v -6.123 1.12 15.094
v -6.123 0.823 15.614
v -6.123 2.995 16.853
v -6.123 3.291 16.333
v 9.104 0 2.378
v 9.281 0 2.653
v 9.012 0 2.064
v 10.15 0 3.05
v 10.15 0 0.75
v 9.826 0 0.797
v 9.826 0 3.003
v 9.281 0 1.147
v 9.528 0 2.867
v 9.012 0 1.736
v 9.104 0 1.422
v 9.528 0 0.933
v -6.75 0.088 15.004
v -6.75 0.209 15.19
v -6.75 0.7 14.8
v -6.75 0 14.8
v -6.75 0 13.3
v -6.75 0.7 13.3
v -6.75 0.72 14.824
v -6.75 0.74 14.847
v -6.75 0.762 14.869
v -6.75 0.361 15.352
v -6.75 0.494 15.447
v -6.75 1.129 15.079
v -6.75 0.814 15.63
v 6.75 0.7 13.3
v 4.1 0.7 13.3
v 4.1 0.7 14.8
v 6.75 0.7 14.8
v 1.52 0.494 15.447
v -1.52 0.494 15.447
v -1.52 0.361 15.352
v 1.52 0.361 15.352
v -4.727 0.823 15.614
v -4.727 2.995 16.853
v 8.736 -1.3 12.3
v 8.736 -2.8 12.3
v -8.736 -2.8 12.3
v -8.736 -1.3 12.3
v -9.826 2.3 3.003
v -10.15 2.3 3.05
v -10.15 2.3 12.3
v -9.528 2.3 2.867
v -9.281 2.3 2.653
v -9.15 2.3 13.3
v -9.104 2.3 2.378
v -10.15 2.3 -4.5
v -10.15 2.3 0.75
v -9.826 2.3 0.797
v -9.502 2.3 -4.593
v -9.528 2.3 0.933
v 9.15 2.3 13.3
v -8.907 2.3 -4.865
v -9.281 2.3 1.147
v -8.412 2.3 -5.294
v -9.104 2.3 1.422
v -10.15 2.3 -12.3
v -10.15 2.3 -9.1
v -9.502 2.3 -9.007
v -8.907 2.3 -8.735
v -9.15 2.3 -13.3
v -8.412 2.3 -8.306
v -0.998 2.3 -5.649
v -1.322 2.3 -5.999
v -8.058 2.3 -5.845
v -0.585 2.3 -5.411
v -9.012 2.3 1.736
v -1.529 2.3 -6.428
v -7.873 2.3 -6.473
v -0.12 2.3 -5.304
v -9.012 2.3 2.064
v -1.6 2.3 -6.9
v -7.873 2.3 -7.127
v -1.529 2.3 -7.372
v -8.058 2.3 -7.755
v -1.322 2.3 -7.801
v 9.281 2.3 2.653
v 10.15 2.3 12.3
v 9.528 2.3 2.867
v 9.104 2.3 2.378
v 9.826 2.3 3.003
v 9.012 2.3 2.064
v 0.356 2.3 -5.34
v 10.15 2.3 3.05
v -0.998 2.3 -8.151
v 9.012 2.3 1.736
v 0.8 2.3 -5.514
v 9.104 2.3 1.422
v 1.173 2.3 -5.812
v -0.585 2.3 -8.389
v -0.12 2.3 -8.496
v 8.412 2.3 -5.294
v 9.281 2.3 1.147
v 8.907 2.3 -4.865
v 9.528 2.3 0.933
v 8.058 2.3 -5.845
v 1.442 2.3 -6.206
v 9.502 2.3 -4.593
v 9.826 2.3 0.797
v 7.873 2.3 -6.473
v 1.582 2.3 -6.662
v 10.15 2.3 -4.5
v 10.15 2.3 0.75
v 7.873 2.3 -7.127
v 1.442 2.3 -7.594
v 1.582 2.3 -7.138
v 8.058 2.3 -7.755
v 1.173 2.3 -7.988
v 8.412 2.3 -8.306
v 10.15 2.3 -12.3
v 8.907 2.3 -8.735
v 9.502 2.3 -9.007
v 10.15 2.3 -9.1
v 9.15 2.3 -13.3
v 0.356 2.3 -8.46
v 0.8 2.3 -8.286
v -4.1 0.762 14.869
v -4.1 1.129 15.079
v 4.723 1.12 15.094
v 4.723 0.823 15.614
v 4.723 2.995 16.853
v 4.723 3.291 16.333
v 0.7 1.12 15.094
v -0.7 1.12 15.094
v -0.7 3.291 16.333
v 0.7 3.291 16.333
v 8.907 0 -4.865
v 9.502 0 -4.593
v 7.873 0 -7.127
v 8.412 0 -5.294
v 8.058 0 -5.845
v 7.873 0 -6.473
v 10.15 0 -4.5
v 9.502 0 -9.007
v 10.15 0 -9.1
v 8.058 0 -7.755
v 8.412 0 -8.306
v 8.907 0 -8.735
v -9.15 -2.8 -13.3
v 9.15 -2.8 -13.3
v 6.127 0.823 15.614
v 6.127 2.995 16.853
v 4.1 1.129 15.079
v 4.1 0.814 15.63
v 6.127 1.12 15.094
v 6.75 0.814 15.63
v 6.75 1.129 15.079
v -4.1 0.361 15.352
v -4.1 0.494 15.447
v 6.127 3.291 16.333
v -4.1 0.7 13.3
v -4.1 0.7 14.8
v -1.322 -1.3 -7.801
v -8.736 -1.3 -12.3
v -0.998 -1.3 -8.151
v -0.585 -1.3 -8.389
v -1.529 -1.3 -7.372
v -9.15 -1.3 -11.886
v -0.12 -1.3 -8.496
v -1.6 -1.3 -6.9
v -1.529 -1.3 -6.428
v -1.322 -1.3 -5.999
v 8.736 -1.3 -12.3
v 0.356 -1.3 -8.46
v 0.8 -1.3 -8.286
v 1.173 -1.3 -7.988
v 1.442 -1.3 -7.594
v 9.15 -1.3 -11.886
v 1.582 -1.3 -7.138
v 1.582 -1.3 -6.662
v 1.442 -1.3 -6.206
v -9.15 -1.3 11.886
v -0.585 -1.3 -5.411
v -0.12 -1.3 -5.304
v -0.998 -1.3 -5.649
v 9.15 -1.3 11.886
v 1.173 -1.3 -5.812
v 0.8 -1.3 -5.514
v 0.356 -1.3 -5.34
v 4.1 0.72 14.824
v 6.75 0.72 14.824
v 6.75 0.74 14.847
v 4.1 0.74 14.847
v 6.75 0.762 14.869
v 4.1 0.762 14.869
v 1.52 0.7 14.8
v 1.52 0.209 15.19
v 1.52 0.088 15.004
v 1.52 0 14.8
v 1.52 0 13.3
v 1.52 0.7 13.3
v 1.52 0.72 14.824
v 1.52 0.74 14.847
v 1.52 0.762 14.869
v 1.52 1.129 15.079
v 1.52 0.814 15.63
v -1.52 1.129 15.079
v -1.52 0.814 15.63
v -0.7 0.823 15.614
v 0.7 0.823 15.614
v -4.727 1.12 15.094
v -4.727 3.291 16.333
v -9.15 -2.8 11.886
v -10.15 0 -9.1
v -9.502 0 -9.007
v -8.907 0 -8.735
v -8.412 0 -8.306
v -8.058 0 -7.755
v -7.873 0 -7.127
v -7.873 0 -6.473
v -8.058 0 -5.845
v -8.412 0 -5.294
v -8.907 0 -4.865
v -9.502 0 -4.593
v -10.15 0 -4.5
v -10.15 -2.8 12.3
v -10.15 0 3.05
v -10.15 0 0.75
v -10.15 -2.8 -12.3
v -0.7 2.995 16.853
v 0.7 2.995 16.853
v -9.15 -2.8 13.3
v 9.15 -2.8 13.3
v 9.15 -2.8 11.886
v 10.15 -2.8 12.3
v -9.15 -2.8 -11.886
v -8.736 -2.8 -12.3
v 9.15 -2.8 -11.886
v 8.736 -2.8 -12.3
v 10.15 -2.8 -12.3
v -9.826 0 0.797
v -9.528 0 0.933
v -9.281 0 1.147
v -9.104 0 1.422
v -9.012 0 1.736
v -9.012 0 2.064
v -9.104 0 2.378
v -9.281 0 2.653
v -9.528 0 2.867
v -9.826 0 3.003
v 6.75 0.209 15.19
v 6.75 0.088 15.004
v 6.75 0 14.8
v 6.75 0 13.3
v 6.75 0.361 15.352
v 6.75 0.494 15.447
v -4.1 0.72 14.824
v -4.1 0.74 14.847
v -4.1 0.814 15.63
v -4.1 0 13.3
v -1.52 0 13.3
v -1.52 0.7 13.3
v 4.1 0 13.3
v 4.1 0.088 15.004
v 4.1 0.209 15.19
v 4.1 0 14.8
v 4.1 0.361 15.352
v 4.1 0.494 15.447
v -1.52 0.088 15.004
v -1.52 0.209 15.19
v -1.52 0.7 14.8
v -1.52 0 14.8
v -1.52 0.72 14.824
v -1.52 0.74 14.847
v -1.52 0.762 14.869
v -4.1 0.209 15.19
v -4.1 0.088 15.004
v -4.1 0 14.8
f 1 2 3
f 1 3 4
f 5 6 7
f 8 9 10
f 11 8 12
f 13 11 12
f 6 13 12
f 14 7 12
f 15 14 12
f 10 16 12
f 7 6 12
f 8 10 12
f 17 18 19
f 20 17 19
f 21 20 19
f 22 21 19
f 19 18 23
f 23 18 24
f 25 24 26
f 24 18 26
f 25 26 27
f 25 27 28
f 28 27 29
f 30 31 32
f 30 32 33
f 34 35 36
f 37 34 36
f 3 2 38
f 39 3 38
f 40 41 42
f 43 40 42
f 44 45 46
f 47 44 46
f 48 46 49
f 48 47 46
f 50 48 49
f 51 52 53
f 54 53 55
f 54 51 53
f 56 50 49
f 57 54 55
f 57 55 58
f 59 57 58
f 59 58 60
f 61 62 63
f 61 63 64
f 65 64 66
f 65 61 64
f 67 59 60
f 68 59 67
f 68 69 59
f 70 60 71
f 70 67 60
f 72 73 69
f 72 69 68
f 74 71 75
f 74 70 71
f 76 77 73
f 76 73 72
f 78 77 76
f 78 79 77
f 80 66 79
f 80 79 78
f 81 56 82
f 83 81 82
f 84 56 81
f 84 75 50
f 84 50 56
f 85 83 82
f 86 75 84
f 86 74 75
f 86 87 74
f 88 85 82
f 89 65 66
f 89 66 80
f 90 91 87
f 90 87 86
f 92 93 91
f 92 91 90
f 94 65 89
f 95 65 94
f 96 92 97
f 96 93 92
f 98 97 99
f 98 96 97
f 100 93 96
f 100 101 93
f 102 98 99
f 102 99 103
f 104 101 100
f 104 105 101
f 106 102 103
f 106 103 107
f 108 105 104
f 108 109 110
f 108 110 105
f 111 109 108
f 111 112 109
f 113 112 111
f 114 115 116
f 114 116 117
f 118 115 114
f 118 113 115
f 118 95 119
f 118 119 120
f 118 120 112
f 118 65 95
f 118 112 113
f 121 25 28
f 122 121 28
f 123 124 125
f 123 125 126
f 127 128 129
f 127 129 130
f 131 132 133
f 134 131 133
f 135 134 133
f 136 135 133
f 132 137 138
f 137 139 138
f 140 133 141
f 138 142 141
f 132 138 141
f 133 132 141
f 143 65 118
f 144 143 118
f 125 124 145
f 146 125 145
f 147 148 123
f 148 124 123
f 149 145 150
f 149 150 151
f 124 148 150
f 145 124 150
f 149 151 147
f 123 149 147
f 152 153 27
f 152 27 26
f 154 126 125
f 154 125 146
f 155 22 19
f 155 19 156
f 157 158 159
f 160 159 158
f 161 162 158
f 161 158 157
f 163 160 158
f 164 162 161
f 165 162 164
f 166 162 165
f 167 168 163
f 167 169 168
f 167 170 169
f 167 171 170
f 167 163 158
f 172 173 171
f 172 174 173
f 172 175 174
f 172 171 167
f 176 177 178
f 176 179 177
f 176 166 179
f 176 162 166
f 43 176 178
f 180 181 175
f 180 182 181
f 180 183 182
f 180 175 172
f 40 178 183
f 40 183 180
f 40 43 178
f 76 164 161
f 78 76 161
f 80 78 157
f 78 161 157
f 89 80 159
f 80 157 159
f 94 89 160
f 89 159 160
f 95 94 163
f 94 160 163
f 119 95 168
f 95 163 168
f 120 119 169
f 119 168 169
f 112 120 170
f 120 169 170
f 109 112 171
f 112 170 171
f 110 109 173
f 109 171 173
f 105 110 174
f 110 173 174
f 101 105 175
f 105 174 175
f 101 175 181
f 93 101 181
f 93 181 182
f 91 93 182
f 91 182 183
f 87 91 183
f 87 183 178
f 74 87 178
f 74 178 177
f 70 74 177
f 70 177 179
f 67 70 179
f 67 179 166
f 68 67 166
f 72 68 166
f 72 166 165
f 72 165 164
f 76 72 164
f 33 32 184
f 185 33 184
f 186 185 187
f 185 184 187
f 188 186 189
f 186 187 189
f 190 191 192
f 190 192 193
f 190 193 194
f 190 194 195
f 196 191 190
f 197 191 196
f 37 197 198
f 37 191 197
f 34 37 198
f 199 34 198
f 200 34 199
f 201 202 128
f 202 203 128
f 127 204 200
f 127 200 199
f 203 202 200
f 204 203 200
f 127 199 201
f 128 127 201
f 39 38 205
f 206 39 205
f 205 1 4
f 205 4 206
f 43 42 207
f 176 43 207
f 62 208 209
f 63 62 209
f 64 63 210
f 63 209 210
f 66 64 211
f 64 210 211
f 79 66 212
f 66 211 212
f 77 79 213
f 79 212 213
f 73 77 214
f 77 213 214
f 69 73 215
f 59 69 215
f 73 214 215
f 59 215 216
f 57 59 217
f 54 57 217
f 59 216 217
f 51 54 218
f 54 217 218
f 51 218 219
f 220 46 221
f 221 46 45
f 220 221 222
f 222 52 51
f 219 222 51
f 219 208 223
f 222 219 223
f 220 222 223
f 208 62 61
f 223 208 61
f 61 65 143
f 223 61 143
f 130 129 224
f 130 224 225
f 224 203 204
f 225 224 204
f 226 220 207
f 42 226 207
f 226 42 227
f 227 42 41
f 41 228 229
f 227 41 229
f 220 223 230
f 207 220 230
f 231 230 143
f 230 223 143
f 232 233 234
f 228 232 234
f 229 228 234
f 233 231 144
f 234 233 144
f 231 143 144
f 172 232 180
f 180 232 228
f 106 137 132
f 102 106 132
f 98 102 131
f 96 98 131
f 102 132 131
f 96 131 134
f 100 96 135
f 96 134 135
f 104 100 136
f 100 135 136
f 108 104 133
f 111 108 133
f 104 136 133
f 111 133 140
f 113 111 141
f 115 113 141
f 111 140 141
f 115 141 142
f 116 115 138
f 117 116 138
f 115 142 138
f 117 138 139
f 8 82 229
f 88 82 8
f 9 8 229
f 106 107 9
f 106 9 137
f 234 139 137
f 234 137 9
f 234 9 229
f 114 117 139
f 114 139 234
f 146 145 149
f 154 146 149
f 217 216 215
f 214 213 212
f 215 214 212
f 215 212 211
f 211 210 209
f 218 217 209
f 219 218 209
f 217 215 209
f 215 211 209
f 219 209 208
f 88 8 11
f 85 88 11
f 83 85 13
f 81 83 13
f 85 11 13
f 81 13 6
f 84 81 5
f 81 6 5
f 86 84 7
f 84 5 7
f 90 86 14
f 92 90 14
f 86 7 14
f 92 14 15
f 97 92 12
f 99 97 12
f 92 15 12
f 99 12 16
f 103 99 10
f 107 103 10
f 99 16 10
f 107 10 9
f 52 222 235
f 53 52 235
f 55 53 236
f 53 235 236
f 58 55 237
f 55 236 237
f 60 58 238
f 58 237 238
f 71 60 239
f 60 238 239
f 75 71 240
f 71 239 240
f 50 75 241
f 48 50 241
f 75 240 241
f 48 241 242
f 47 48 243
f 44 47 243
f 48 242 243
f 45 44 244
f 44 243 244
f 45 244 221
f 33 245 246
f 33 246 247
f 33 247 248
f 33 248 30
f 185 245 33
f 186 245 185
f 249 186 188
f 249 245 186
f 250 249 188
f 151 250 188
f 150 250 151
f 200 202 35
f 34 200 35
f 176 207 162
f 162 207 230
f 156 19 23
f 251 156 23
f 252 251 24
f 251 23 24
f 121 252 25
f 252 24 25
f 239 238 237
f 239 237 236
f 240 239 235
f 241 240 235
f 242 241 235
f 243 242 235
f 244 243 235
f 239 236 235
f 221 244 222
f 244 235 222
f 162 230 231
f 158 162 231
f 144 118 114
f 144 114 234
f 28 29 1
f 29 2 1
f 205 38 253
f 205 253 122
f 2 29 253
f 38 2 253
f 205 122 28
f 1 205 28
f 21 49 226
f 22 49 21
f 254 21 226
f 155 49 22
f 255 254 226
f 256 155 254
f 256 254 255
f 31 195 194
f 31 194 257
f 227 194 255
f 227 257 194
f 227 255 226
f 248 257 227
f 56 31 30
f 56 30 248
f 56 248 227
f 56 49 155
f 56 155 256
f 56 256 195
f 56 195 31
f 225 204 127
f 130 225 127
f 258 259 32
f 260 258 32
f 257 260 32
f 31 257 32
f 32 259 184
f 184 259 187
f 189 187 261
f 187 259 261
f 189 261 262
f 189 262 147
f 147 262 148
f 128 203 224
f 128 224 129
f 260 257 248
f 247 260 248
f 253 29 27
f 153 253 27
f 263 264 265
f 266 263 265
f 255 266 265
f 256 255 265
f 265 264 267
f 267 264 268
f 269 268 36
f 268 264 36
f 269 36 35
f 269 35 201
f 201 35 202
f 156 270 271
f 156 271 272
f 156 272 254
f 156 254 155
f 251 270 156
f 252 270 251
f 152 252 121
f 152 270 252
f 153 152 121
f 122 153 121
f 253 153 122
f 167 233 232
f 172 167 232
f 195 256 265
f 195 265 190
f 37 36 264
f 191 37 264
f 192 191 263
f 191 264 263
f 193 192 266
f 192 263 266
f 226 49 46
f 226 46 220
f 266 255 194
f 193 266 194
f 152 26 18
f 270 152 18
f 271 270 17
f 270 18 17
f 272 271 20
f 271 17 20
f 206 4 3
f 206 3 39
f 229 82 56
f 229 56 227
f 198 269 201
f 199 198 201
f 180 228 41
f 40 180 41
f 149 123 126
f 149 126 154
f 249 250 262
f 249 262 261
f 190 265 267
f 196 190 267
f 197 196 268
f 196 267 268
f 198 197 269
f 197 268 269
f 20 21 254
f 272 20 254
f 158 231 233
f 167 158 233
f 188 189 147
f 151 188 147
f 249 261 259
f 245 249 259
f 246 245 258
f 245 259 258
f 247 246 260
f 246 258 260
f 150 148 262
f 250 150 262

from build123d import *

# Parameters (mm, degrees)
SKETCH_1_W                  = 20.3
SKETCH_1_H                  = 26.6
EXTRUDE_1_DEPTH             = 5.1
HOLE_WIZARD_3_2_3_2_1_D     = 3.2
HOLE_WIZARD_2_3_2_3_1_D     = 2.3
HOLE_WIZARD_2_3_2_3_1_DEPTH = 2.3
HOLE_WIZARD_4_6_4_6_1_D     = 4.6
HOLE_WIZARD_4_6_4_6_1_DEPTH = 2.3
CHAMFER_1_SIZE              = 1
SKETCH_20_R                 = 1.6
CUT_EXTRUDE_7_DEPTH         = 1.5
SKETCH_2_W                  = 2.65
SKETCH_2_H                  = 0.7
SKETCH_2_W_2                = 3.04
EXTRUDE_2_DEPTH             = 1.5
SWEEP_START                 = -6.75
SWEEP_1_DEPTH               = 2.65
SWEEP_START_2               = -1.52
SWEEP_2_DEPTH               = 3.04
SWEEP_START_3               = 4.1
SWEEP_3_DEPTH               = 2.65
CUT_EXTRUDE_8_DEPTH         = 1
CUT_EXTRUDE_8_DEPTH_BACK    = 15.5
SKETCH_25_W                 = 1.3965698
SKETCH_25_H                 = 0.598451561
SKETCH_25_W_2               = 1.400753048
SKETCH_25_W_3               = 1.404395486
EXTRUDE_3_DEPTH             = 2.5


# Read off the part's stored shape, not the designer's step: По траектории1, По траектории2, По траектории3
with BuildPart() as part:
    # Эскиз1 → Бобышка-Вытянуть1 (new body)
    with BuildSketch(Plane(origin=(0, 2.3, 0), x_dir=(1, 0, 0), z_dir=(0, 1, 0))):
        Rectangle(SKETCH_1_W, SKETCH_1_H)
    extrude(amount=-EXTRUDE_1_DEPTH)

    # Диаметр отверстия Ø3.2 (3.2)1 (through all)
    with Locations(Plane(origin=(0, 2.3, 0), x_dir=(1, 0, 0), z_dir=(0, 1, 0))):
        with Locations((0, 6.9)):
            Hole(HOLE_WIZARD_3_2_3_2_1_D / 2)

    # Диаметр отверстия Ø2.3 (2.3)1
    with Locations(Plane(origin=(0, 2.3, 0), x_dir=(1, 0, 0), z_dir=(0, 1, 0))):
        with Locations((10.15, -1.9), (-10.15, -1.9)):
            Hole(HOLE_WIZARD_2_3_2_3_1_D / 2, depth=HOLE_WIZARD_2_3_2_3_1_DEPTH)

    # Диаметр отверстия Ø4.6 (4.6)1
    with Locations(Plane(origin=(0, 2.3, 0), x_dir=(1, 0, 0), z_dir=(0, 1, 0))):
        with Locations((10.15, 6.8), (-10.15, 6.8)):
            Hole(HOLE_WIZARD_4_6_4_6_1_D / 2, depth=HOLE_WIZARD_4_6_4_6_1_DEPTH)

    # Фаска1
    chamfer_1_edges = [part.edges().sort_by_distance(p)[0] for p in [
        (-10.15, -0.25, -13.3),
        (10.15, -0.25, -13.3),
        (10.15, -0.25, 13.3),
        (-10.15, -0.25, 13.3),
    ]]
    chamfer(chamfer_1_edges, length=CHAMFER_1_SIZE)

    # Эскиз20 → Вырез-Вытянуть7 (cut)
    with BuildSketch(Plane.XZ.offset(2.8)):
        Polygon((-8.735786438, -12.3), (8.735786438, -12.3), (9.15, -11.885786438), (9.15, 11.885786438), (8.735786438, 12.3), (-8.735786438, 12.3), (-9.15, 11.885786438), (-9.15, -11.885786438), align=None)
        with Locations(Location((0, -6.9, 0), (0, 0, 90))):
            Circle(SKETCH_20_R, mode=Mode.SUBTRACT)
    extrude(amount=-CUT_EXTRUDE_7_DEPTH, mode=Mode.SUBTRACT)

    # Эскиз2 → Бобышка-Вытянуть2 (add)
    with BuildSketch(Plane.XY.offset(13.3)):
        with Locations((-5.425, 0.35)):
            Rectangle(SKETCH_2_W, SKETCH_2_H)
        with Locations((0, 0.35)):
            Rectangle(SKETCH_2_W_2, SKETCH_2_H)
        with Locations((5.425, 0.35)):
            Rectangle(SKETCH_2_W, SKETCH_2_H)
    extrude(amount=EXTRUDE_2_DEPTH)

    # По траектории1 outline → По траектории1 (add)
    with BuildSketch(Plane.YZ.offset(SWEEP_START)):
        with BuildLine():
            Line((0.761891294, 14.869390662), (1.385375103, 15.225085604))
            Line((1.385375103, 15.225085604), (0.81420695, 15.629766886))
            Line((0.81420695, 15.629766886), (0.494271743, 15.44724517))
            Line((0.494271743, 15.44724517), (0.36086417, 15.351999112))
            ThreePointArc((0.36086417, 15.351999112), (0.144711062, 15.099351835), (0, 14.8))
            Line((0, 14.8), (0.7, 14.8))
            ThreePointArc((0.7, 14.8), (0.729738232, 14.835772255), (0.761891294, 14.869390662))
        make_face()
    extrude(amount=SWEEP_1_DEPTH)

    # По траектории2 outline → По траектории2 (add)
    with BuildSketch(Plane.YZ.offset(SWEEP_START_2)):
        with BuildLine():
            Line((0.761891294, 14.869390662), (1.385375103, 15.225085604))
            Line((1.385375103, 15.225085604), (0.81420695, 15.629766886))
            Line((0.81420695, 15.629766886), (0.494271743, 15.44724517))
            Line((0.494271743, 15.44724517), (0.36086417, 15.351999112))
            ThreePointArc((0.36086417, 15.351999112), (0.144711062, 15.099351835), (0, 14.8))
            Line((0, 14.8), (0.7, 14.8))
            ThreePointArc((0.7, 14.8), (0.729738232, 14.835772255), (0.761891294, 14.869390662))
        make_face()
    extrude(amount=SWEEP_2_DEPTH)

    # По траектории3 outline → По траектории3 (add)
    with BuildSketch(Plane.YZ.offset(SWEEP_START_3)):
        with BuildLine():
            Line((0.761891294, 14.869390662), (1.385375103, 15.225085604))
            Line((1.385375103, 15.225085604), (0.81420695, 15.629766886))
            Line((0.81420695, 15.629766886), (0.494271743, 15.44724517))
            Line((0.494271743, 15.44724517), (0.36086417, 15.351999112))
            ThreePointArc((0.36086417, 15.351999112), (0.144711062, 15.099351835), (0, 14.8))
            Line((0, 14.8), (0.7, 14.8))
            ThreePointArc((0.7, 14.8), (0.729738232, 14.835772255), (0.761891294, 14.869390662))
        make_face()
    extrude(amount=SWEEP_3_DEPTH)

    # Эскиз24 → Вырез-Вытянуть8 (cut, two sides: drawn at the far end of the back side and taken through both)
    with BuildSketch(Plane.ZY.offset(6.75).offset(-CUT_EXTRUDE_8_DEPTH_BACK)):
        Polygon((15.629766886, 0.81420695), (15.0115294, 1.166908885), (15.187532371, 1.475417638), (15.841474348, 1.102346438), (15.665471376, 0.793837685), align=None)
    extrude(amount=CUT_EXTRUDE_8_DEPTH + CUT_EXTRUDE_8_DEPTH_BACK, mode=Mode.SUBTRACT)

    # Эскиз25 → Бобышка-Вытянуть3 (add)
    with BuildSketch(Plane(origin=(0, 7.341514488, 4.188303737), x_dir=(1, 0, 0), z_dir=(0, 0.8685919072443863, 0.49552810078698817))):
        with Locations((-5.425, -12.855160228)):
            Rectangle(SKETCH_25_W, SKETCH_25_H)
        with Locations((0, -12.855160228)):
            Rectangle(SKETCH_25_W_2, SKETCH_25_H)
        with Locations((5.425, -12.855160228)):
            Rectangle(SKETCH_25_W_3, SKETCH_25_H)
    extrude(amount=EXTRUDE_3_DEPTH)


solid = part.part
